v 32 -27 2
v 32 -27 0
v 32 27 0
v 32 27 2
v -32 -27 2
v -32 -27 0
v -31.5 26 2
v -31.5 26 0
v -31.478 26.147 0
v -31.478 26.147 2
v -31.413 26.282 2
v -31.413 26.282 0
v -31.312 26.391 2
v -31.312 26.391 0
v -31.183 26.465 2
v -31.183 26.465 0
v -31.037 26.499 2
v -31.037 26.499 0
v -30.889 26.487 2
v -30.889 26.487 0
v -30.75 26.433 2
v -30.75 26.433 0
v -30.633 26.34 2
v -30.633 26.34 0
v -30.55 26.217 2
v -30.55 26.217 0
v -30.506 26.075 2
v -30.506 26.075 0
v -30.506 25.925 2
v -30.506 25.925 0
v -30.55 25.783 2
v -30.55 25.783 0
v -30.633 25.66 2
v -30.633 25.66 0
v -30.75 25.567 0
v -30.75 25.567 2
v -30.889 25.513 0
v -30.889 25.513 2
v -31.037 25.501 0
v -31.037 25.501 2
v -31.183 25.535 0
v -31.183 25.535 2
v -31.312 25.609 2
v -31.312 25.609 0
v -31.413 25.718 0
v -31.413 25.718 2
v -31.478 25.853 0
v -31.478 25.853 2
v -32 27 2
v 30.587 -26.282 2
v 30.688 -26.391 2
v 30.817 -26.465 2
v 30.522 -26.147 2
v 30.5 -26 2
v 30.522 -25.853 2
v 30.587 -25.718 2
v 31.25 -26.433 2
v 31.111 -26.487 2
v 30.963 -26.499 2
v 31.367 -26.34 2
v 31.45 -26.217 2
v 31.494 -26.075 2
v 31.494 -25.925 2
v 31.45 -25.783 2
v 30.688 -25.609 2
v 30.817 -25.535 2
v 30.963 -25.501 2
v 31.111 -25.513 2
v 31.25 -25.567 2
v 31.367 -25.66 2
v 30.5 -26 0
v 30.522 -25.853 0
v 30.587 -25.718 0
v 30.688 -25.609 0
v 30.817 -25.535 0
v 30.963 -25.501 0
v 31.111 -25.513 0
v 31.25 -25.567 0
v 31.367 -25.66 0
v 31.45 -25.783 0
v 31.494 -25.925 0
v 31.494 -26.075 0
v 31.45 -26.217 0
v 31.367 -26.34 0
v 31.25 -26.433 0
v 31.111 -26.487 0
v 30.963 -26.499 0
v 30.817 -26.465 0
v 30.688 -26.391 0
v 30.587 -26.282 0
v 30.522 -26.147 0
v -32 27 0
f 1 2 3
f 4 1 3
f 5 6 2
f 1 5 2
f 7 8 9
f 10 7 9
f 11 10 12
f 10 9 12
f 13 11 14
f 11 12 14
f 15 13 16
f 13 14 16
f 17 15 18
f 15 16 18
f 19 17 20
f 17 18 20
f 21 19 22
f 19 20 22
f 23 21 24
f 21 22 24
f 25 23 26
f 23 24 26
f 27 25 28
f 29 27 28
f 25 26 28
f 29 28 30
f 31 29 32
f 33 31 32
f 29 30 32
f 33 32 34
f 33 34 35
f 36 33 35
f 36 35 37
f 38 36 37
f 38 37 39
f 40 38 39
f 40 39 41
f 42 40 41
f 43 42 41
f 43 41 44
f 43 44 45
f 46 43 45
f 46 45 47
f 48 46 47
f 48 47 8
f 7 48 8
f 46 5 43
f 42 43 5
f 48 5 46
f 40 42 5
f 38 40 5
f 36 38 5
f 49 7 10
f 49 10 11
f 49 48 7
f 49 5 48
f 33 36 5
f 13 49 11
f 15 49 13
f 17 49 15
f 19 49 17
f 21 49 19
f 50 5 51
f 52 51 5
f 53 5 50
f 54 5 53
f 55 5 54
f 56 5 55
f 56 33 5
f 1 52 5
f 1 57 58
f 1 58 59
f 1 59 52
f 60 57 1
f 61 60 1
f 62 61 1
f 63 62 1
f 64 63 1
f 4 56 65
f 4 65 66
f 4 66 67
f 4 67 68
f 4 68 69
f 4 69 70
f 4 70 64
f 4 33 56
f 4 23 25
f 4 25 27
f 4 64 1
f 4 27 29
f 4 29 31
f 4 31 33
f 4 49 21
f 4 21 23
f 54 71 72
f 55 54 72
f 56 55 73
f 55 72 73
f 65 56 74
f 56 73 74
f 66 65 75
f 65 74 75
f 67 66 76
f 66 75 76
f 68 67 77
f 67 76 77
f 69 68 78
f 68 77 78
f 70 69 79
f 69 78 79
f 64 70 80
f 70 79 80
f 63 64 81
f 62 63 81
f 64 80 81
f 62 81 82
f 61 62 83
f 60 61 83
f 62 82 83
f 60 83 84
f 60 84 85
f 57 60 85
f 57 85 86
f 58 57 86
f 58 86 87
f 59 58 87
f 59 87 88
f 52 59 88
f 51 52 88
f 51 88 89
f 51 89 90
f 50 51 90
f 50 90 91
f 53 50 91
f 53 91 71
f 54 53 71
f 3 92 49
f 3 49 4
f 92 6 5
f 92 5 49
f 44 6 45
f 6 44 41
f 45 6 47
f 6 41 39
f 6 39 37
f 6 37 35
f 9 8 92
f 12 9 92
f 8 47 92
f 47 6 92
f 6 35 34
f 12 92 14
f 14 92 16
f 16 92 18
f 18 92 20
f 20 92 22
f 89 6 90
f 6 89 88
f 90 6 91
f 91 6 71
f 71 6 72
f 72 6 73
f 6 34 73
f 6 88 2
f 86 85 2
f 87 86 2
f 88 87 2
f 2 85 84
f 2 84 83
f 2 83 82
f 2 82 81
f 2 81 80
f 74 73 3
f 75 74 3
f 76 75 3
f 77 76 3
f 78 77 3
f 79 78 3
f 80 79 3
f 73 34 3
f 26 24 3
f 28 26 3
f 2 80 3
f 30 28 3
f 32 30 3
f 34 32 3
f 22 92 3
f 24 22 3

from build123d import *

# Parameters (mm, degrees)
F0_W     = 64
F0_H     = 54
F1_DEPTH = 2
F4_D     = 1
F5_D     = 1


with BuildPart() as f1:
    # F0 (on Top) → F1 (new body)
    with BuildSketch(Plane.XY):
        Rectangle(F0_W, F0_H)
    extrude(amount=F1_DEPTH)

    # F4 (through all)
    with Locations(Plane.XY.offset(2)):
        with Locations((31, -26)):
            Hole(F4_D / 2)

    # F5 (through all)
    with Locations(Plane.XY.offset(2)):
        with Locations((-31, 26)):
            Hole(F5_D / 2)


solid = f1.part
